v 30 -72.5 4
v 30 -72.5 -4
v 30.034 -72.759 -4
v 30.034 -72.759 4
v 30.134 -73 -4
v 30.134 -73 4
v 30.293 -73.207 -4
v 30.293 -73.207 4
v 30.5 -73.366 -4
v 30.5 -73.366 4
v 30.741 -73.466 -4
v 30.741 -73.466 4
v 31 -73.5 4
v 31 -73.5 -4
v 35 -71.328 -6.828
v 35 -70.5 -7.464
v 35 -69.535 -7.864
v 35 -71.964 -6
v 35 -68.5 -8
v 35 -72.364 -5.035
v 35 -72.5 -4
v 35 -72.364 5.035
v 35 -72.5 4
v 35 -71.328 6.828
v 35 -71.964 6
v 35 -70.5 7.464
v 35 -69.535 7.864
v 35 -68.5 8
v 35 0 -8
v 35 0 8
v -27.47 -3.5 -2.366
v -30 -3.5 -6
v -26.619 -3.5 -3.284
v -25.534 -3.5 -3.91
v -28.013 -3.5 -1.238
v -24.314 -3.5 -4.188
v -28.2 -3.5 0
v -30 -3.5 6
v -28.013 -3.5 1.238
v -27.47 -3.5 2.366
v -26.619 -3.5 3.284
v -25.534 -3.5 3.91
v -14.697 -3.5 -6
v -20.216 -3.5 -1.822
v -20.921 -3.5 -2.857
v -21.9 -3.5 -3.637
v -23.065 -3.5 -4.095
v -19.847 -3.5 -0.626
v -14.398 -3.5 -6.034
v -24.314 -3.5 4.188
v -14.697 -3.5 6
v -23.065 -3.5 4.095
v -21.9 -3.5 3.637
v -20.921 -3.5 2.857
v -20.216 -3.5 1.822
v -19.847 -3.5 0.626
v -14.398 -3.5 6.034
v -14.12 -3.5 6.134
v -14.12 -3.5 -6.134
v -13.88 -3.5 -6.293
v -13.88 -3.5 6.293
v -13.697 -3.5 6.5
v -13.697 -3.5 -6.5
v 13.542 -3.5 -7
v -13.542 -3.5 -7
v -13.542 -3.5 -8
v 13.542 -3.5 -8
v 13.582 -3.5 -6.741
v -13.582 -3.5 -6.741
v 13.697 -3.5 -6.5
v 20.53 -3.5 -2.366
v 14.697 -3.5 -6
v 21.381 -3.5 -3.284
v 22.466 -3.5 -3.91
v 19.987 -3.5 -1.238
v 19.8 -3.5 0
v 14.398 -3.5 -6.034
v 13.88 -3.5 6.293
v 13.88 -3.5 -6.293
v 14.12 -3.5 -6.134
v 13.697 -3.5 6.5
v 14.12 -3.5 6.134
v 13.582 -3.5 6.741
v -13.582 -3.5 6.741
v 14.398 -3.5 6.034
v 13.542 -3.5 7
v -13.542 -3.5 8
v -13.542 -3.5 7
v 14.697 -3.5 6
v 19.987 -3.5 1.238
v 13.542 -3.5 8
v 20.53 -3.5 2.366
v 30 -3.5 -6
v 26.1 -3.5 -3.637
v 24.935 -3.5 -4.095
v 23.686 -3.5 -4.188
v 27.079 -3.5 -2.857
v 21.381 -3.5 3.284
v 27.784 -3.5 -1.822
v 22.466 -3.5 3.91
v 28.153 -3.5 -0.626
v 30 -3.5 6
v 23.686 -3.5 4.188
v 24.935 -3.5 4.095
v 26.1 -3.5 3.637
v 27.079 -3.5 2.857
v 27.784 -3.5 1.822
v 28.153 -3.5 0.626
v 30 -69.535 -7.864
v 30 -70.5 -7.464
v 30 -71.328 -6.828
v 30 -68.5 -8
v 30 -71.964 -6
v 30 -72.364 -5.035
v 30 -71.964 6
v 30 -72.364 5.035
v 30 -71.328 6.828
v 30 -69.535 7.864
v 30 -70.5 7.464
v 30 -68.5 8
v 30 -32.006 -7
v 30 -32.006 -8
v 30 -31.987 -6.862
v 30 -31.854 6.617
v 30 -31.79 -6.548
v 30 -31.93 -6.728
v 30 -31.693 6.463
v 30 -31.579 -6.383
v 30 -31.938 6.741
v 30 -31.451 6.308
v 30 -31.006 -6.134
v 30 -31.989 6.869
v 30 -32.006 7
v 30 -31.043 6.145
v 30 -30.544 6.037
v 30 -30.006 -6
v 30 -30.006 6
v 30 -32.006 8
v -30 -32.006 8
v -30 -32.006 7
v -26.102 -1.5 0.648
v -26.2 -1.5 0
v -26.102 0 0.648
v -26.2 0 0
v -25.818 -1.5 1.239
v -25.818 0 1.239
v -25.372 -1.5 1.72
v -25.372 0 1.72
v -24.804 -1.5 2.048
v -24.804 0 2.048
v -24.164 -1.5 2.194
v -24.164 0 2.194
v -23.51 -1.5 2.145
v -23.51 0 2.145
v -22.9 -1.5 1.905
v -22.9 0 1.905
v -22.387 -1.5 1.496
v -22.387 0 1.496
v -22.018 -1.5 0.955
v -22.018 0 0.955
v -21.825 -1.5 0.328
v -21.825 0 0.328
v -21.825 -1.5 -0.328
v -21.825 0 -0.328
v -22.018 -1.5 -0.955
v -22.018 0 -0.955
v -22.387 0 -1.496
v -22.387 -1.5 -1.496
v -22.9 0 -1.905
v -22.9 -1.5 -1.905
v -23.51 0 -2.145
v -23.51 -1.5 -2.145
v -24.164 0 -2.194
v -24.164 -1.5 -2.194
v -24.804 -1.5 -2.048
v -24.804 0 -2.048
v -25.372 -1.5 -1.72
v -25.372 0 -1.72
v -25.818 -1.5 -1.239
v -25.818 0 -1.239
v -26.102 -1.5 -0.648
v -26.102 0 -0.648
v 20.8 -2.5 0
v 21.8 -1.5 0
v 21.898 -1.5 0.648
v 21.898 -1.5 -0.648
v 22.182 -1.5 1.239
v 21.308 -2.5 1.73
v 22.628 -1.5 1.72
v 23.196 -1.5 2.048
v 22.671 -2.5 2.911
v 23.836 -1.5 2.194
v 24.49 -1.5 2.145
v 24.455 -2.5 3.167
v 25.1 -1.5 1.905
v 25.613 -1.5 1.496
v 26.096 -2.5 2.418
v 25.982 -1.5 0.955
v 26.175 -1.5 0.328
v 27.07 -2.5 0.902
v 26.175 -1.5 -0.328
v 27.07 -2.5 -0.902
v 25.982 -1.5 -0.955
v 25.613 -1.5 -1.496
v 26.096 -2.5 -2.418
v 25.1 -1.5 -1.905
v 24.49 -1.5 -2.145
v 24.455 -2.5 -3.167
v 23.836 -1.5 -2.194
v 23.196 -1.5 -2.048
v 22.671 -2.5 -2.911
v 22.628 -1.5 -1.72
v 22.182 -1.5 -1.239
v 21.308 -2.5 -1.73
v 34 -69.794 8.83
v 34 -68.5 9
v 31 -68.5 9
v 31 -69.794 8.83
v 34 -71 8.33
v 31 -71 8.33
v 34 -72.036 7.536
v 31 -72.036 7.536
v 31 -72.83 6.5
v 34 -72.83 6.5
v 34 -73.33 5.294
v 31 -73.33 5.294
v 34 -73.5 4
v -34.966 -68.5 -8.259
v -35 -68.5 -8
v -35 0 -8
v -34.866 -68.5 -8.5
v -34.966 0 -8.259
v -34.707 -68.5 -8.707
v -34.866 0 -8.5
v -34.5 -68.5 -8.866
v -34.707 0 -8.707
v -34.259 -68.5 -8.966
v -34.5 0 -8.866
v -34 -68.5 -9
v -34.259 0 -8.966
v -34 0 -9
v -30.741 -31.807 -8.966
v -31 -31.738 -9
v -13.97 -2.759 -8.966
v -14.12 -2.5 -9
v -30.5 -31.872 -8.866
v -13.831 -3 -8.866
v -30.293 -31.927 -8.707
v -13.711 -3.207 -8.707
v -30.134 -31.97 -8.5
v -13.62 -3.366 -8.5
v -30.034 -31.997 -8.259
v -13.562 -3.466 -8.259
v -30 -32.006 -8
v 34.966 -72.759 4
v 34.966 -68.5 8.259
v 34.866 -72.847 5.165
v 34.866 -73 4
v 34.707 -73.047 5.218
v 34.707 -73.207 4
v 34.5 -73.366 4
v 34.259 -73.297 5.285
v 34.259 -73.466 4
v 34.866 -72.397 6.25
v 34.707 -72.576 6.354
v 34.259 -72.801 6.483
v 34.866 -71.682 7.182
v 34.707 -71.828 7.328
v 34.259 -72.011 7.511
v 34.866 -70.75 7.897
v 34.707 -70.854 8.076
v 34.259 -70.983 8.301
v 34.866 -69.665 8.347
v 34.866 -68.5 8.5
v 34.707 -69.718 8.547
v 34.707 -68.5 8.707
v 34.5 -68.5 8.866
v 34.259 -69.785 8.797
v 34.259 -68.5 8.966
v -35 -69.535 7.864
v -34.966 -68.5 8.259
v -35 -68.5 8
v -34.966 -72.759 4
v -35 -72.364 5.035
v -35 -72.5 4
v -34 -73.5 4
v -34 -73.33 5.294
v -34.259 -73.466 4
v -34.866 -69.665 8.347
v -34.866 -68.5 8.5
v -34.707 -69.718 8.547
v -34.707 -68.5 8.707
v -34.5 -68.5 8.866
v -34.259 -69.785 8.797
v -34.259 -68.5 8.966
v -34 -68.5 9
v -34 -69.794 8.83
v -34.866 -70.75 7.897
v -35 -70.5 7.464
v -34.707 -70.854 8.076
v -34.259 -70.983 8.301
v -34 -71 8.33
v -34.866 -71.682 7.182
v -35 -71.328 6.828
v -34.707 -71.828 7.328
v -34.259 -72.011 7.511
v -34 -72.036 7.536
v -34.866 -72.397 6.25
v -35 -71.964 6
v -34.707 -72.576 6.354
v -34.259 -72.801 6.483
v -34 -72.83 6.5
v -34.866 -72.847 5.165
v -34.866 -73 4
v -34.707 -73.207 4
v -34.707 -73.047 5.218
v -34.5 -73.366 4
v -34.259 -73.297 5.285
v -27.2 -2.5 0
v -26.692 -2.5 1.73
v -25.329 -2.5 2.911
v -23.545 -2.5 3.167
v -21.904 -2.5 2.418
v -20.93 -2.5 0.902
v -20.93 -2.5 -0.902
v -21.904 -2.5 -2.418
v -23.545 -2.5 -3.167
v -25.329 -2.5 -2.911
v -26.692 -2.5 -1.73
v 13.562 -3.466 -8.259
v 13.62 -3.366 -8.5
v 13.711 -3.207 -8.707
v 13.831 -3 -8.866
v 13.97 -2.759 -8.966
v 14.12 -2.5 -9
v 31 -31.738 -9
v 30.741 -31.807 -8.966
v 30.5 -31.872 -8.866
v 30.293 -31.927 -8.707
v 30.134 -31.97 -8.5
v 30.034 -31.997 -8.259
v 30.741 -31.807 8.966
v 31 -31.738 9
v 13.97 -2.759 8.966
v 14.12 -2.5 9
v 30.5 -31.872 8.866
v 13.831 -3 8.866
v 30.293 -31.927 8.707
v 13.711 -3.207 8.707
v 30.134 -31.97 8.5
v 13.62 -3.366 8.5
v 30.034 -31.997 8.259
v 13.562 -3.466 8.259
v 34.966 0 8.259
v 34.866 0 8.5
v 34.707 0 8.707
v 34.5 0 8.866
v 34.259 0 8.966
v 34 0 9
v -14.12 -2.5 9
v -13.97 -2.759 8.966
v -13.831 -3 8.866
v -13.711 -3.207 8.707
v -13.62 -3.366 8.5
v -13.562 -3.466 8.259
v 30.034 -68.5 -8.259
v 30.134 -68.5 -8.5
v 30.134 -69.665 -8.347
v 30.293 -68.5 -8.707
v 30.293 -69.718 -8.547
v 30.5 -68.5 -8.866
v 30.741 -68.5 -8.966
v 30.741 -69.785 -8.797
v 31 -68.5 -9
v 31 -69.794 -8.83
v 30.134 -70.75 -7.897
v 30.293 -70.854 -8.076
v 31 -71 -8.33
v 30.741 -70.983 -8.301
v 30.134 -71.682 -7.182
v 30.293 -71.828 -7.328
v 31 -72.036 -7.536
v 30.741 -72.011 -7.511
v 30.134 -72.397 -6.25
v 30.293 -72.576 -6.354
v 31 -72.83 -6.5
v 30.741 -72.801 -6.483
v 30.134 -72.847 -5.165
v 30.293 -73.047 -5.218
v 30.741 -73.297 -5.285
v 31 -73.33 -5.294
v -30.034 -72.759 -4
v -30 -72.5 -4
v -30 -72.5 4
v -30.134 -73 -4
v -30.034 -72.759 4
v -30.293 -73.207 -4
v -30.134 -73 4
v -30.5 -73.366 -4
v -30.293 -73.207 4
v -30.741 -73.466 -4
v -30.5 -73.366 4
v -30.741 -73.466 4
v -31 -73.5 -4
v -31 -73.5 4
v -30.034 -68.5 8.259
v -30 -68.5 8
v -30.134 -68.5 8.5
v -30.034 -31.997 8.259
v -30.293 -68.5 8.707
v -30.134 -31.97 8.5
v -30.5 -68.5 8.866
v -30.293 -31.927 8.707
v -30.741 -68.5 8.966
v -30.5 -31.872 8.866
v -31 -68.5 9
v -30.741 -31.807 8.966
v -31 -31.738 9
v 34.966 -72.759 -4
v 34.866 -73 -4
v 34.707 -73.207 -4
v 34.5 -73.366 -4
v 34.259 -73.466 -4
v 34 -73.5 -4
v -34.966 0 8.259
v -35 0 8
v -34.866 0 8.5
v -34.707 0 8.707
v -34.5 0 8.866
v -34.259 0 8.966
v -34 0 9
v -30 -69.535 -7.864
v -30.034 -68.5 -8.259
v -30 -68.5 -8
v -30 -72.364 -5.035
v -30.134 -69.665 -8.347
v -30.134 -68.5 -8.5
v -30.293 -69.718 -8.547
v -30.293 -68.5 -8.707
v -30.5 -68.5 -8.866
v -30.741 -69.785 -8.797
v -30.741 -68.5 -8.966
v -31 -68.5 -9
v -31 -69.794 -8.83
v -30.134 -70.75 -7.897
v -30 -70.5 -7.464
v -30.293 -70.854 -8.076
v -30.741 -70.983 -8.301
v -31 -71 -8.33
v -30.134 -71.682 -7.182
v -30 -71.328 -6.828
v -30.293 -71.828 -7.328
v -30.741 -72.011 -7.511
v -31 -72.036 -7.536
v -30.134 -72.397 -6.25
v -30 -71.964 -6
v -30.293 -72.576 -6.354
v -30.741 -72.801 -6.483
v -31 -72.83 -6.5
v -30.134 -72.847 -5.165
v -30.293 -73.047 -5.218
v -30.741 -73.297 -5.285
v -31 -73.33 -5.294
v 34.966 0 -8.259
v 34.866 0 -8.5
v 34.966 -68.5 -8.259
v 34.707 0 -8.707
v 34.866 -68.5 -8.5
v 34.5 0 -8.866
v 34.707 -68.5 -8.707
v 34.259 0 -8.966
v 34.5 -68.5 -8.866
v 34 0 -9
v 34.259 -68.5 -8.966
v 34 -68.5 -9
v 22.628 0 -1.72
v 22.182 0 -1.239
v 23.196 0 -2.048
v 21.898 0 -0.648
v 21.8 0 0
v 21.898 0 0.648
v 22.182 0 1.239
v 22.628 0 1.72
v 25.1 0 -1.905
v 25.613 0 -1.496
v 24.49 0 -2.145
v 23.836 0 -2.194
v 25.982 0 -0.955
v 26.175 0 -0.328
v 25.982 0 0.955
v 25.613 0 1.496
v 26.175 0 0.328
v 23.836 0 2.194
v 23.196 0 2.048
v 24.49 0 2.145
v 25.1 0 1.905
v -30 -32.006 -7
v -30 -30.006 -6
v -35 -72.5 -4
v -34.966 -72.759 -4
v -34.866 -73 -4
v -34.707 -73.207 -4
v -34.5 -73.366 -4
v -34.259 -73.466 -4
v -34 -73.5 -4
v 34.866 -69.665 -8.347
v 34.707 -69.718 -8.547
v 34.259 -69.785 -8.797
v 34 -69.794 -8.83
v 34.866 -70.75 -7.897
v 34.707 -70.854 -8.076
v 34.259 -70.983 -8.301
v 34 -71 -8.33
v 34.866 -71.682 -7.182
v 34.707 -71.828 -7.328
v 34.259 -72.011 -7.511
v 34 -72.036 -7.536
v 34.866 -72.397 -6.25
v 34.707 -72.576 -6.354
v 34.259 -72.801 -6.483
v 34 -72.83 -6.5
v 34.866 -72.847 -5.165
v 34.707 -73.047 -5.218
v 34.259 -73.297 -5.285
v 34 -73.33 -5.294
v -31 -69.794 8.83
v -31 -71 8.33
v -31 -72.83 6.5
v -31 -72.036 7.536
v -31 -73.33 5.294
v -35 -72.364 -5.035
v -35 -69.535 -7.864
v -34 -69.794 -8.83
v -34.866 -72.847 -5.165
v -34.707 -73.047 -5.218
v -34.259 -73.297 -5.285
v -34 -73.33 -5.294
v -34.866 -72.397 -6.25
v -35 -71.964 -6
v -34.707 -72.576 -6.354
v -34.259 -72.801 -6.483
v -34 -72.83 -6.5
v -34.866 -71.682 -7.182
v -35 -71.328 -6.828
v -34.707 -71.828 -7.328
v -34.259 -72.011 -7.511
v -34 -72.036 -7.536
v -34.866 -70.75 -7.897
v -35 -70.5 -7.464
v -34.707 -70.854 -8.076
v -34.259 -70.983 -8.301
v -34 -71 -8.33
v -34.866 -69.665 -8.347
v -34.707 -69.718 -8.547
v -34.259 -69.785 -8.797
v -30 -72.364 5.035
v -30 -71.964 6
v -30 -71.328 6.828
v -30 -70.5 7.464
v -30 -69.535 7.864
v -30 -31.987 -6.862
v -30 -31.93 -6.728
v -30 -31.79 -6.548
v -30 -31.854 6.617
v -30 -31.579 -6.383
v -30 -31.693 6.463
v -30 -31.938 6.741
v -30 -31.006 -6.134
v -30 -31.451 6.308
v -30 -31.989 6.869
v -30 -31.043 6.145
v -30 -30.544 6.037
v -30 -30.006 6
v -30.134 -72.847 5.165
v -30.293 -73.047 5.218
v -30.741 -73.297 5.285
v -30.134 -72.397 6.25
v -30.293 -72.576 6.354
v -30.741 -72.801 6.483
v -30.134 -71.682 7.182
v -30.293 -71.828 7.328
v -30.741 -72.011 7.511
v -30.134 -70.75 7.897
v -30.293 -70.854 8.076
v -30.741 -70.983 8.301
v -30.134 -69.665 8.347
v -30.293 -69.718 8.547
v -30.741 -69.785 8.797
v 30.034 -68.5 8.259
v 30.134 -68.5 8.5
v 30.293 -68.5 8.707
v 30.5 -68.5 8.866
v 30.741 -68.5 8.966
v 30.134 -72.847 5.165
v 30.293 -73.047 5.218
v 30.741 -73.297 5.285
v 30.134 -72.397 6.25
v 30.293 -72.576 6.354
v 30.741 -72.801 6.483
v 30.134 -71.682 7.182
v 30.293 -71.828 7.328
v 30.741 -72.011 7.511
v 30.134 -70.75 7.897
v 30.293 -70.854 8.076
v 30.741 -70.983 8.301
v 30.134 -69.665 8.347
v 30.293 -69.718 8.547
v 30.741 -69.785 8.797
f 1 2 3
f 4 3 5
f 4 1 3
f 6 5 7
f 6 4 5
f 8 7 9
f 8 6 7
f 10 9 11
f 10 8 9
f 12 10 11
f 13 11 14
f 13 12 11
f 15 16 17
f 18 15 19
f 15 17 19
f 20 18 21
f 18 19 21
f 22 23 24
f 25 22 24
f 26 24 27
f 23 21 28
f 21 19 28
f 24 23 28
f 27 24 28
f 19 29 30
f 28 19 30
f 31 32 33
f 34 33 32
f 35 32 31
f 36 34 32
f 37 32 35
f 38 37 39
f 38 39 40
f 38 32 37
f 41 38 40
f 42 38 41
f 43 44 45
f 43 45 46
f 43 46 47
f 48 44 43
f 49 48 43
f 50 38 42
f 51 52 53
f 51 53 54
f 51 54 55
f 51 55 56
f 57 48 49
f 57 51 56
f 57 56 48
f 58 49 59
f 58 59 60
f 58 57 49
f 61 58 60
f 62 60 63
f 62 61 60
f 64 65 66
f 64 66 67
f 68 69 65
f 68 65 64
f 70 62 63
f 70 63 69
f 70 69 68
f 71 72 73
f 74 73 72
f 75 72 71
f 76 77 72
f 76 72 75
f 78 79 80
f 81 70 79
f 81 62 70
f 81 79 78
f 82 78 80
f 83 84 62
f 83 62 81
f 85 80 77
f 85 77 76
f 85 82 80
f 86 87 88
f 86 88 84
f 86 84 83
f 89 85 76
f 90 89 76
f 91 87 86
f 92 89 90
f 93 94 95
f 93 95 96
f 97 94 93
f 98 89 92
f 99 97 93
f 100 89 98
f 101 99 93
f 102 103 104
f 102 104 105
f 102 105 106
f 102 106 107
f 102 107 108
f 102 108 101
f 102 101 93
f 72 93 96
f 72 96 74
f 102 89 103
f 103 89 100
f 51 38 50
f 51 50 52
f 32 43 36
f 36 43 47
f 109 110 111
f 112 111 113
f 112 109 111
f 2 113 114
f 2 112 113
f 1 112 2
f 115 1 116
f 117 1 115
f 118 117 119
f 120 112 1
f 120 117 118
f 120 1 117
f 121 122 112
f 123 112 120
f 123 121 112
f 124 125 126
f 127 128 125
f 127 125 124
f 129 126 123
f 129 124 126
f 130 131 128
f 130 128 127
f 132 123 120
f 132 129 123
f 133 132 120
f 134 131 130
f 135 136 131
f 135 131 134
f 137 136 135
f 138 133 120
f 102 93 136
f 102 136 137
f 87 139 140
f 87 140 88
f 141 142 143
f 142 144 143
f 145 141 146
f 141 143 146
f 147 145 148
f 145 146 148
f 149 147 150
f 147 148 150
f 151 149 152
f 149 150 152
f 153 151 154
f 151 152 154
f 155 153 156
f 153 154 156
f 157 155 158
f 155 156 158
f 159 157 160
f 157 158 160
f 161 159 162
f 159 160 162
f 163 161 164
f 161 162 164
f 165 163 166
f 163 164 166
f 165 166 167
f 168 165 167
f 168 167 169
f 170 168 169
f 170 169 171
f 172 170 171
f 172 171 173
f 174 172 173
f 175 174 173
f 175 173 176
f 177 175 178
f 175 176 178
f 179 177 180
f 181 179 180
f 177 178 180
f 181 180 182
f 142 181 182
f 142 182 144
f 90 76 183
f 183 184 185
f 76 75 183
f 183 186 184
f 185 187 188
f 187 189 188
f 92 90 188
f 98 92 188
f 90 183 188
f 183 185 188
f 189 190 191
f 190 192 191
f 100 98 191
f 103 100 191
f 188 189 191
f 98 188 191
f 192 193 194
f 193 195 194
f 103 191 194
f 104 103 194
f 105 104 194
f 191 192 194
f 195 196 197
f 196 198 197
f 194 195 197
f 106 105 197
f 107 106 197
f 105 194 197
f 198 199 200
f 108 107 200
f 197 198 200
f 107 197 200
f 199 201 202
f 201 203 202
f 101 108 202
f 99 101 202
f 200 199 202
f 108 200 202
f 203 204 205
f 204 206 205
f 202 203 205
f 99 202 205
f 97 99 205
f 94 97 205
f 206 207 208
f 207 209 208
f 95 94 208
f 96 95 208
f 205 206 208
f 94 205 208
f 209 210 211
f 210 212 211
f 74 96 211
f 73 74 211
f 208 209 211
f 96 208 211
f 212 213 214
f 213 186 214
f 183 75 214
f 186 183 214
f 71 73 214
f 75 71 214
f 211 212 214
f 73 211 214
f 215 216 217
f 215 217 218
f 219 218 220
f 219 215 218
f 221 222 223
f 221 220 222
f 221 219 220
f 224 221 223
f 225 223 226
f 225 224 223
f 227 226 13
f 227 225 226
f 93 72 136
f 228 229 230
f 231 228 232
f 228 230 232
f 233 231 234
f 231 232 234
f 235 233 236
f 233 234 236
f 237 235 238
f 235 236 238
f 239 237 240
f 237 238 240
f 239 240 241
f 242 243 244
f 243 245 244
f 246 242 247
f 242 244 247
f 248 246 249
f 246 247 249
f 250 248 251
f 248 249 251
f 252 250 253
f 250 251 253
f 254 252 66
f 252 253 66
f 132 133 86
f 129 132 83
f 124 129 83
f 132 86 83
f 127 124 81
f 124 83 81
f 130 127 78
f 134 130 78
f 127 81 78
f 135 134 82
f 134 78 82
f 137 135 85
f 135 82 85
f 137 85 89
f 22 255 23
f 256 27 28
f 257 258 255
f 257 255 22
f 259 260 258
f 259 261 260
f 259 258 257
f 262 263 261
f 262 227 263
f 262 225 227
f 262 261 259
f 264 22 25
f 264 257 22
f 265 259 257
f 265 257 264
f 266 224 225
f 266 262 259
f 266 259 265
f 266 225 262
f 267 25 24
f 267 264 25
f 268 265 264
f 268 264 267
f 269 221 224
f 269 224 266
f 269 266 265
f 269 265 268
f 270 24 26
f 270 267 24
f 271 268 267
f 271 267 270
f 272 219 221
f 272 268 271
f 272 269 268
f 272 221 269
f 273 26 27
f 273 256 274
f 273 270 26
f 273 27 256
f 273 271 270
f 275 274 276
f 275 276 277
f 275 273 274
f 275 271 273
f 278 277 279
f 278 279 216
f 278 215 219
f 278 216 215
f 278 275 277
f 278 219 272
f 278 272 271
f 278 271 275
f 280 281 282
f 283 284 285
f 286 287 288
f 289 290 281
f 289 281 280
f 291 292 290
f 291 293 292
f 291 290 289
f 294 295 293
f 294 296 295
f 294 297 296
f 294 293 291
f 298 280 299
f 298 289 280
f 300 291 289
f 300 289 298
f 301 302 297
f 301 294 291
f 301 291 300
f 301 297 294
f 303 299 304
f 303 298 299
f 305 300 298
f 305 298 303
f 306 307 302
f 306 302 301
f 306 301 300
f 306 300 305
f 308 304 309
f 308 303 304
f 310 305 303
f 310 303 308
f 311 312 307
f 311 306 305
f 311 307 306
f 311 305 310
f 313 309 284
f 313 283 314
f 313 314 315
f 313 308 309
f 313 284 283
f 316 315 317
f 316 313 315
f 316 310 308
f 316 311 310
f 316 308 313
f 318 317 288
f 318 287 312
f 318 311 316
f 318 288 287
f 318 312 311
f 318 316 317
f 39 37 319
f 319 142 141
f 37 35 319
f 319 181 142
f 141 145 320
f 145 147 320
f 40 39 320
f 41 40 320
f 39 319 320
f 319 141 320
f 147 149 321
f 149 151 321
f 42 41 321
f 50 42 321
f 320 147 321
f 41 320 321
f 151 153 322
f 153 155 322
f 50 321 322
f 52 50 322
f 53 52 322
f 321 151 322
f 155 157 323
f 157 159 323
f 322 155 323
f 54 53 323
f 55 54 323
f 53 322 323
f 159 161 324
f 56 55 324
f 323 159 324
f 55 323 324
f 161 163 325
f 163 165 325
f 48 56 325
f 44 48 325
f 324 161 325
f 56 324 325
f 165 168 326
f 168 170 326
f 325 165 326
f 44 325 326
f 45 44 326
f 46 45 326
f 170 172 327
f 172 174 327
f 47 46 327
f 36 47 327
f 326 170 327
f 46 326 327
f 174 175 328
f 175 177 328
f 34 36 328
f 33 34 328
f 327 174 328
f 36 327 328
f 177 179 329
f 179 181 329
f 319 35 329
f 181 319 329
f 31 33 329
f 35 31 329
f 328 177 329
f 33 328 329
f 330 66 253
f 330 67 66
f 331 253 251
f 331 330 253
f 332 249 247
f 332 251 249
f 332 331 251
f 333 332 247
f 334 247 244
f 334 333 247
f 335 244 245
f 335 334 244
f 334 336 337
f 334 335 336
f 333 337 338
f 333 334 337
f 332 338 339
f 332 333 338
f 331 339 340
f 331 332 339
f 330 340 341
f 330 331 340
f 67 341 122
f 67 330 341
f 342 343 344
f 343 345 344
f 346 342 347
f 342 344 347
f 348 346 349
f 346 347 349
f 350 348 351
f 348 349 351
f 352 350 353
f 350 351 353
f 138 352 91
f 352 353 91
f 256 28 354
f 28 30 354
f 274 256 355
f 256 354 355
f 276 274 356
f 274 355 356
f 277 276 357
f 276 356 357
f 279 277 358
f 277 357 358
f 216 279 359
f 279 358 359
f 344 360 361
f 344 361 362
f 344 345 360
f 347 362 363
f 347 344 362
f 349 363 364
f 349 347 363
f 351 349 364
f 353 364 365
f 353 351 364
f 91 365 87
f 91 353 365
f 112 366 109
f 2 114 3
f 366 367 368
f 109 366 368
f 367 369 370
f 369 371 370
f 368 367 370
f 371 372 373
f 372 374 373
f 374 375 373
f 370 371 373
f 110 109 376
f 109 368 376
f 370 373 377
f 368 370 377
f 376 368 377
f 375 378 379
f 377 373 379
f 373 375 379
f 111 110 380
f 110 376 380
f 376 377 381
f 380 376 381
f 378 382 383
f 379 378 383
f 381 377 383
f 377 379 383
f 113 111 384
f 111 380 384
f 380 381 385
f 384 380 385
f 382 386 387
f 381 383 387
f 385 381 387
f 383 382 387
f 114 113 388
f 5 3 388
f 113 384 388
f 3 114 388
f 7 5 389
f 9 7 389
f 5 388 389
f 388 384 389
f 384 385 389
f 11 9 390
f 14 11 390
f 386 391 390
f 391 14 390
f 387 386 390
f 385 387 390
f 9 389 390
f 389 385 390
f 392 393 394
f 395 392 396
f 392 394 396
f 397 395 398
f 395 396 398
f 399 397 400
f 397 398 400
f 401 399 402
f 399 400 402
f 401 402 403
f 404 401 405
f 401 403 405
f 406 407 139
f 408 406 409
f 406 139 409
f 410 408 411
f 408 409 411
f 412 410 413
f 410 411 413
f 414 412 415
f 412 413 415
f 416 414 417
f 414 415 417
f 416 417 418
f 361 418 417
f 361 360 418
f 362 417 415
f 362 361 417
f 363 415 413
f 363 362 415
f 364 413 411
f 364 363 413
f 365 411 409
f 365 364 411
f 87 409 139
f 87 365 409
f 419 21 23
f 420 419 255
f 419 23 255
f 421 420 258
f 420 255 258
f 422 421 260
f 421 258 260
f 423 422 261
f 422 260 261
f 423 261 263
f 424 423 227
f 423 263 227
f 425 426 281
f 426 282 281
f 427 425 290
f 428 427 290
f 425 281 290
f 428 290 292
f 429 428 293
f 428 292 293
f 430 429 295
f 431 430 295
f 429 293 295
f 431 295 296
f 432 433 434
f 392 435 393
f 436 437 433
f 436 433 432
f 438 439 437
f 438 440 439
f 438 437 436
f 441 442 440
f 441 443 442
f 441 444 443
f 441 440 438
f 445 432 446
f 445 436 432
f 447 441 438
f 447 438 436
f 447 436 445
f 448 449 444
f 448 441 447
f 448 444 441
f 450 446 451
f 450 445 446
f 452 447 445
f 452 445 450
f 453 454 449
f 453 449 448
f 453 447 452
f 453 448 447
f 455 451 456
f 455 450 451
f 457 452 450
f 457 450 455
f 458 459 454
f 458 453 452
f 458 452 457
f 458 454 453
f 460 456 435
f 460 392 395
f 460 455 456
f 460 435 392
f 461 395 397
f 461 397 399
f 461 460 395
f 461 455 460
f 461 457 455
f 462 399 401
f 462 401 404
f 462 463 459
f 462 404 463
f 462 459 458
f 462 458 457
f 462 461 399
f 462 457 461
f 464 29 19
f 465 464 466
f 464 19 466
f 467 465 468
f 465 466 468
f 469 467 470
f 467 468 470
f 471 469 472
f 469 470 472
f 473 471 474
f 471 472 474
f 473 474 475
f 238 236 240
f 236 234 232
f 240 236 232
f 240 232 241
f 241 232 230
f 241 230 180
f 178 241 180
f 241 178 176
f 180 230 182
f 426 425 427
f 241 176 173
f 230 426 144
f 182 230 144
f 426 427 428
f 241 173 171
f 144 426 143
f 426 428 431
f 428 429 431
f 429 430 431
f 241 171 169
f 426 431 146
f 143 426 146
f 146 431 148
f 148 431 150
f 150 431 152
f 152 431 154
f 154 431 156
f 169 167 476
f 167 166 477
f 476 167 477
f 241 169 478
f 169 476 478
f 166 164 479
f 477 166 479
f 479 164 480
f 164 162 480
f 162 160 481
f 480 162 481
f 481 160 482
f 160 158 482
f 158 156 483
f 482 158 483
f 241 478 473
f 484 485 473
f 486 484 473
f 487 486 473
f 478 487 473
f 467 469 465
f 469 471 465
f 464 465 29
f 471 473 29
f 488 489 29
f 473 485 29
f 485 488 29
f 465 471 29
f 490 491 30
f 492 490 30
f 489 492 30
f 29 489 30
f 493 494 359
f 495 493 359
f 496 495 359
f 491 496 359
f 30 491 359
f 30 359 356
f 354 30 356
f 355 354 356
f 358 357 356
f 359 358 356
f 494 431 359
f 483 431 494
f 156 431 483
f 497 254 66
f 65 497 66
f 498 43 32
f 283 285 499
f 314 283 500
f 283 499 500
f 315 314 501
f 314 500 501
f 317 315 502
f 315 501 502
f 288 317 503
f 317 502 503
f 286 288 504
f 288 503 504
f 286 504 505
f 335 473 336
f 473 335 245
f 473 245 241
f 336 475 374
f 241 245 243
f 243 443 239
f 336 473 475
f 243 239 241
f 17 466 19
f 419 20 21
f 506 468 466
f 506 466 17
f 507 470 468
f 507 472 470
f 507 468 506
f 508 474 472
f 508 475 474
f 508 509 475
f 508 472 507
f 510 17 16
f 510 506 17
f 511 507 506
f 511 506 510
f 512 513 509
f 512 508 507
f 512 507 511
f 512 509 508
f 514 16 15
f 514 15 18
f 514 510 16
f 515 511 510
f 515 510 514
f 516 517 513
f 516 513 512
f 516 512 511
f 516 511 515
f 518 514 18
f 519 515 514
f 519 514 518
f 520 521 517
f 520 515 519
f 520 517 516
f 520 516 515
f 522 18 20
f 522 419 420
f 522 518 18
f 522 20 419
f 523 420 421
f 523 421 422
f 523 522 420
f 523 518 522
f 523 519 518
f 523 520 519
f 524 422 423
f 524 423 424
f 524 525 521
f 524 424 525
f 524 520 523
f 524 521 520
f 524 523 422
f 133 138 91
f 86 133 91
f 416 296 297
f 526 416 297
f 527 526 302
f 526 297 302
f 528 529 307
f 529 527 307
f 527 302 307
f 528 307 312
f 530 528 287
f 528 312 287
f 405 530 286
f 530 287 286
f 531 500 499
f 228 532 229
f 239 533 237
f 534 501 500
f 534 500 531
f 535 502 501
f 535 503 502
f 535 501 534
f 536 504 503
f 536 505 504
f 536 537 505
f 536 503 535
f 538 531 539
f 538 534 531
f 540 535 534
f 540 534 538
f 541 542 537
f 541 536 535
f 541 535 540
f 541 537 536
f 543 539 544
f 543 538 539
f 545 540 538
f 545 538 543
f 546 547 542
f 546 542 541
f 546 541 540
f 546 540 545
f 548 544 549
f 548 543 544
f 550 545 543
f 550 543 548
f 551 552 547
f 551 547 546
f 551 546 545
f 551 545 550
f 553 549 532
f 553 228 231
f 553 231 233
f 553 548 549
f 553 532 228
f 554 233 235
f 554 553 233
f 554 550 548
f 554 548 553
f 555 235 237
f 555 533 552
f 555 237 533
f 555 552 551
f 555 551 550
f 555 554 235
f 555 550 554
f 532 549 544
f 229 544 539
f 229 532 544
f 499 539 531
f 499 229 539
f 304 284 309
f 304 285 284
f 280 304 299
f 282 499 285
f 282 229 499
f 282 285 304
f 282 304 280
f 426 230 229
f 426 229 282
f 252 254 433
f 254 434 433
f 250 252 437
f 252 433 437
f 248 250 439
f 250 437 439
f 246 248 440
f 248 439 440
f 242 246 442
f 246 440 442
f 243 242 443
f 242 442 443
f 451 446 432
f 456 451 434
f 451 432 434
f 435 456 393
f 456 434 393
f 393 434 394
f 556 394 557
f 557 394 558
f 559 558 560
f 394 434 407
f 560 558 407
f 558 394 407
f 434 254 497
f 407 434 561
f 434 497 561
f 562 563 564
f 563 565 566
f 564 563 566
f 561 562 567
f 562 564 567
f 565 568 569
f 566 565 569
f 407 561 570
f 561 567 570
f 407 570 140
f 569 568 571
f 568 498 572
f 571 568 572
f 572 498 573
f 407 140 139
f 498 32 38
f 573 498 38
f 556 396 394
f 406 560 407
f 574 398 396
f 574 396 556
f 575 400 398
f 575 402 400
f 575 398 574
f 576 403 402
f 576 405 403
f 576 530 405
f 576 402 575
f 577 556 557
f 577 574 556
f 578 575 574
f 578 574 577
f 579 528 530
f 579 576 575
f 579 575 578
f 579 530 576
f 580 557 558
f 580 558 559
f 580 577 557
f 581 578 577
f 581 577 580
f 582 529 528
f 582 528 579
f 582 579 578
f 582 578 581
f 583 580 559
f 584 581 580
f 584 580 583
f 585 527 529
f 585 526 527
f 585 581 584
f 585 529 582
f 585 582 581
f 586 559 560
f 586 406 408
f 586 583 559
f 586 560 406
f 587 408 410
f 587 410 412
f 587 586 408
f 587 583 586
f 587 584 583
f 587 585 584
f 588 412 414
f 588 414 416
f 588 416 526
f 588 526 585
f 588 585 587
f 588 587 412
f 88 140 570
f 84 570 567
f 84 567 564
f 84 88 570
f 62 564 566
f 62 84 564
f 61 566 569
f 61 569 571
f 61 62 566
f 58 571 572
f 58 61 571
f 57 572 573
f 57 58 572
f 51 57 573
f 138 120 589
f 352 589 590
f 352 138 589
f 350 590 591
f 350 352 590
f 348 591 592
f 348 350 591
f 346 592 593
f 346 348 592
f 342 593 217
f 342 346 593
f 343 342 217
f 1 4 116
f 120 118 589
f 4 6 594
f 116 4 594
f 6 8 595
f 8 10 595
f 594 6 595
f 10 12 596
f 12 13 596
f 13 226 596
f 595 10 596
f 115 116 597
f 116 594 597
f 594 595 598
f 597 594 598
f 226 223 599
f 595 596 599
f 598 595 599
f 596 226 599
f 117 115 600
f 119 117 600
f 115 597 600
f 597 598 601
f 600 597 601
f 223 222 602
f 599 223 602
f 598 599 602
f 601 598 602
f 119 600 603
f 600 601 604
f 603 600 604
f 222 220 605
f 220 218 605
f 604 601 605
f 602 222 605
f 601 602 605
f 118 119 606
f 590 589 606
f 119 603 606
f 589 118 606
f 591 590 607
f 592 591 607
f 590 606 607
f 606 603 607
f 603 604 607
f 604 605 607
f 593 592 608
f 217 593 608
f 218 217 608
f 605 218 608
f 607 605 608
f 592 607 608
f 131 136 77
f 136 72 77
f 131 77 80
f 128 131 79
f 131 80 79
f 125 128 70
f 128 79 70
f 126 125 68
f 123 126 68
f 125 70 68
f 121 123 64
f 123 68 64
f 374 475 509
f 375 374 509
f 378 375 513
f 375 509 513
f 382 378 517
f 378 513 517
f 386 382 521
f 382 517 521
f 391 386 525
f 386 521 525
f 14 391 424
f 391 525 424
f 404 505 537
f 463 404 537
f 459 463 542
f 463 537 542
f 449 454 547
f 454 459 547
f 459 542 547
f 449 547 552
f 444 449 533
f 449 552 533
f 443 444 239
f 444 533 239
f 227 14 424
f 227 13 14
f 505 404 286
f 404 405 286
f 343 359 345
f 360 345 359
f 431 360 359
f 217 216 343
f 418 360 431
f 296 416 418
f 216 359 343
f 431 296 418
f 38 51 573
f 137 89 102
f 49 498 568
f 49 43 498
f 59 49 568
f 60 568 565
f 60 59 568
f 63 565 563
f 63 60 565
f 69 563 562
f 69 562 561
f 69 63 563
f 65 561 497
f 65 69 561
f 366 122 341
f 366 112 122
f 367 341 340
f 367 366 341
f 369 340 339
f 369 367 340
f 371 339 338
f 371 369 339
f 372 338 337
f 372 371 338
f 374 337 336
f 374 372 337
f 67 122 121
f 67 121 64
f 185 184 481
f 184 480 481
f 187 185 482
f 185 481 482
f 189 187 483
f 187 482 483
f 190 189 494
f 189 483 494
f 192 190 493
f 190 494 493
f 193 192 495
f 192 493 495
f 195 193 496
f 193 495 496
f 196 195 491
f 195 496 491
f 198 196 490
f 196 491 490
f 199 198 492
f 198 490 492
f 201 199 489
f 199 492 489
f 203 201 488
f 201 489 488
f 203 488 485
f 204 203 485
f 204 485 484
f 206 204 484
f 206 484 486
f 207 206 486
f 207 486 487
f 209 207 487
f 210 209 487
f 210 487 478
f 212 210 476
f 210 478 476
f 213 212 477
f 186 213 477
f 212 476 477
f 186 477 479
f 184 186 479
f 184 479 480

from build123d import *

# Parameters (mm, degrees)
F0_W            = 70
F0_H            = 18
F1_DEPTH        = 3.5
F2_W            = 5
F2_H            = 18
F3_DEPTH        = 70
F5_DEPTH        = 3
F8_R            = 5
F9_R            = 1
F11_D           = 4.4
F11_CSINK_D     = 8.4
F11_CSINK_ANGLE = 90


with BuildPart() as f1:
    # F0 (on Front) → F1 (new body)
    with BuildSketch(Plane.XZ):
        Rectangle(F0_W, F0_H)
    extrude(amount=F1_DEPTH)

    # F2 (on face) → F3 (join)
    with BuildSketch(Plane.XZ.offset(3.5)):
        with Locations((32.5, 0)):
            Rectangle(F2_W, F2_H)
    extrude(amount=F3_DEPTH)

    # F4 (on face) → F5 (join)
    with BuildSketch(Plane(origin=(0, 0, -9), x_dir=(1, 0, 0), z_dir=(0, 0, -1))):
        Polygon((13.5421621762, 3.5), (30, 3.5), (30, 32.0058112935), align=None)
    extrude(amount=-F5_DEPTH)

    # F6: F1 across plane


with BuildPart() as f1_1:
    add(f1.part)
    add(f1.part.mirror(Plane.XY))

    # F7: F1 across plane


with BuildPart() as f1_2:
    add(f1_1.part)
    add(f1_1.part.mirror(Plane.YZ))

    # F8
    f8_edges = [f1_2.edges().sort_by_distance(p)[0] for p in [
        (-32.5, -73.5, -9),
        (-32.5, -73.5, 9),
        (32.5, -73.5, -9),
        (32.5, -73.5, 9),
    ]]
    fillet(f8_edges, radius=F8_R)

    # F9
    f9_edges = [f1_2.edges().sort_by_distance(p)[0] for p in [
        (-35, -34.25, -9),
        (35, -34.25, -9),
        (-30, -50.252906, -9),
        (30, -50.252906, -9),
        (-21.771081, -17.752906, -9),
        (0, -3.5, -9),
        (21.771081, -17.752906, 9),
        (-21.771081, -17.752906, 9),
        (0, -3.5, 9),
        (21.771081, -17.752906, 6),
        (21.771081, -17.752906, -6),
        (-21.771081, -17.752906, 6),
        (-21.771081, -17.752906, -6),
        (21.771081, -17.752906, -9),
    ]]
    fillet(f9_edges, radius=F9_R)

    # F11 (through all)
    with Locations(Plane.XZ.offset(3.5)):
        with Locations((-24, 0), (24, 0)):
            CounterSinkHole(F11_D / 2, F11_CSINK_D / 2, counter_sink_angle=F11_CSINK_ANGLE)


solid = f1_2.part
